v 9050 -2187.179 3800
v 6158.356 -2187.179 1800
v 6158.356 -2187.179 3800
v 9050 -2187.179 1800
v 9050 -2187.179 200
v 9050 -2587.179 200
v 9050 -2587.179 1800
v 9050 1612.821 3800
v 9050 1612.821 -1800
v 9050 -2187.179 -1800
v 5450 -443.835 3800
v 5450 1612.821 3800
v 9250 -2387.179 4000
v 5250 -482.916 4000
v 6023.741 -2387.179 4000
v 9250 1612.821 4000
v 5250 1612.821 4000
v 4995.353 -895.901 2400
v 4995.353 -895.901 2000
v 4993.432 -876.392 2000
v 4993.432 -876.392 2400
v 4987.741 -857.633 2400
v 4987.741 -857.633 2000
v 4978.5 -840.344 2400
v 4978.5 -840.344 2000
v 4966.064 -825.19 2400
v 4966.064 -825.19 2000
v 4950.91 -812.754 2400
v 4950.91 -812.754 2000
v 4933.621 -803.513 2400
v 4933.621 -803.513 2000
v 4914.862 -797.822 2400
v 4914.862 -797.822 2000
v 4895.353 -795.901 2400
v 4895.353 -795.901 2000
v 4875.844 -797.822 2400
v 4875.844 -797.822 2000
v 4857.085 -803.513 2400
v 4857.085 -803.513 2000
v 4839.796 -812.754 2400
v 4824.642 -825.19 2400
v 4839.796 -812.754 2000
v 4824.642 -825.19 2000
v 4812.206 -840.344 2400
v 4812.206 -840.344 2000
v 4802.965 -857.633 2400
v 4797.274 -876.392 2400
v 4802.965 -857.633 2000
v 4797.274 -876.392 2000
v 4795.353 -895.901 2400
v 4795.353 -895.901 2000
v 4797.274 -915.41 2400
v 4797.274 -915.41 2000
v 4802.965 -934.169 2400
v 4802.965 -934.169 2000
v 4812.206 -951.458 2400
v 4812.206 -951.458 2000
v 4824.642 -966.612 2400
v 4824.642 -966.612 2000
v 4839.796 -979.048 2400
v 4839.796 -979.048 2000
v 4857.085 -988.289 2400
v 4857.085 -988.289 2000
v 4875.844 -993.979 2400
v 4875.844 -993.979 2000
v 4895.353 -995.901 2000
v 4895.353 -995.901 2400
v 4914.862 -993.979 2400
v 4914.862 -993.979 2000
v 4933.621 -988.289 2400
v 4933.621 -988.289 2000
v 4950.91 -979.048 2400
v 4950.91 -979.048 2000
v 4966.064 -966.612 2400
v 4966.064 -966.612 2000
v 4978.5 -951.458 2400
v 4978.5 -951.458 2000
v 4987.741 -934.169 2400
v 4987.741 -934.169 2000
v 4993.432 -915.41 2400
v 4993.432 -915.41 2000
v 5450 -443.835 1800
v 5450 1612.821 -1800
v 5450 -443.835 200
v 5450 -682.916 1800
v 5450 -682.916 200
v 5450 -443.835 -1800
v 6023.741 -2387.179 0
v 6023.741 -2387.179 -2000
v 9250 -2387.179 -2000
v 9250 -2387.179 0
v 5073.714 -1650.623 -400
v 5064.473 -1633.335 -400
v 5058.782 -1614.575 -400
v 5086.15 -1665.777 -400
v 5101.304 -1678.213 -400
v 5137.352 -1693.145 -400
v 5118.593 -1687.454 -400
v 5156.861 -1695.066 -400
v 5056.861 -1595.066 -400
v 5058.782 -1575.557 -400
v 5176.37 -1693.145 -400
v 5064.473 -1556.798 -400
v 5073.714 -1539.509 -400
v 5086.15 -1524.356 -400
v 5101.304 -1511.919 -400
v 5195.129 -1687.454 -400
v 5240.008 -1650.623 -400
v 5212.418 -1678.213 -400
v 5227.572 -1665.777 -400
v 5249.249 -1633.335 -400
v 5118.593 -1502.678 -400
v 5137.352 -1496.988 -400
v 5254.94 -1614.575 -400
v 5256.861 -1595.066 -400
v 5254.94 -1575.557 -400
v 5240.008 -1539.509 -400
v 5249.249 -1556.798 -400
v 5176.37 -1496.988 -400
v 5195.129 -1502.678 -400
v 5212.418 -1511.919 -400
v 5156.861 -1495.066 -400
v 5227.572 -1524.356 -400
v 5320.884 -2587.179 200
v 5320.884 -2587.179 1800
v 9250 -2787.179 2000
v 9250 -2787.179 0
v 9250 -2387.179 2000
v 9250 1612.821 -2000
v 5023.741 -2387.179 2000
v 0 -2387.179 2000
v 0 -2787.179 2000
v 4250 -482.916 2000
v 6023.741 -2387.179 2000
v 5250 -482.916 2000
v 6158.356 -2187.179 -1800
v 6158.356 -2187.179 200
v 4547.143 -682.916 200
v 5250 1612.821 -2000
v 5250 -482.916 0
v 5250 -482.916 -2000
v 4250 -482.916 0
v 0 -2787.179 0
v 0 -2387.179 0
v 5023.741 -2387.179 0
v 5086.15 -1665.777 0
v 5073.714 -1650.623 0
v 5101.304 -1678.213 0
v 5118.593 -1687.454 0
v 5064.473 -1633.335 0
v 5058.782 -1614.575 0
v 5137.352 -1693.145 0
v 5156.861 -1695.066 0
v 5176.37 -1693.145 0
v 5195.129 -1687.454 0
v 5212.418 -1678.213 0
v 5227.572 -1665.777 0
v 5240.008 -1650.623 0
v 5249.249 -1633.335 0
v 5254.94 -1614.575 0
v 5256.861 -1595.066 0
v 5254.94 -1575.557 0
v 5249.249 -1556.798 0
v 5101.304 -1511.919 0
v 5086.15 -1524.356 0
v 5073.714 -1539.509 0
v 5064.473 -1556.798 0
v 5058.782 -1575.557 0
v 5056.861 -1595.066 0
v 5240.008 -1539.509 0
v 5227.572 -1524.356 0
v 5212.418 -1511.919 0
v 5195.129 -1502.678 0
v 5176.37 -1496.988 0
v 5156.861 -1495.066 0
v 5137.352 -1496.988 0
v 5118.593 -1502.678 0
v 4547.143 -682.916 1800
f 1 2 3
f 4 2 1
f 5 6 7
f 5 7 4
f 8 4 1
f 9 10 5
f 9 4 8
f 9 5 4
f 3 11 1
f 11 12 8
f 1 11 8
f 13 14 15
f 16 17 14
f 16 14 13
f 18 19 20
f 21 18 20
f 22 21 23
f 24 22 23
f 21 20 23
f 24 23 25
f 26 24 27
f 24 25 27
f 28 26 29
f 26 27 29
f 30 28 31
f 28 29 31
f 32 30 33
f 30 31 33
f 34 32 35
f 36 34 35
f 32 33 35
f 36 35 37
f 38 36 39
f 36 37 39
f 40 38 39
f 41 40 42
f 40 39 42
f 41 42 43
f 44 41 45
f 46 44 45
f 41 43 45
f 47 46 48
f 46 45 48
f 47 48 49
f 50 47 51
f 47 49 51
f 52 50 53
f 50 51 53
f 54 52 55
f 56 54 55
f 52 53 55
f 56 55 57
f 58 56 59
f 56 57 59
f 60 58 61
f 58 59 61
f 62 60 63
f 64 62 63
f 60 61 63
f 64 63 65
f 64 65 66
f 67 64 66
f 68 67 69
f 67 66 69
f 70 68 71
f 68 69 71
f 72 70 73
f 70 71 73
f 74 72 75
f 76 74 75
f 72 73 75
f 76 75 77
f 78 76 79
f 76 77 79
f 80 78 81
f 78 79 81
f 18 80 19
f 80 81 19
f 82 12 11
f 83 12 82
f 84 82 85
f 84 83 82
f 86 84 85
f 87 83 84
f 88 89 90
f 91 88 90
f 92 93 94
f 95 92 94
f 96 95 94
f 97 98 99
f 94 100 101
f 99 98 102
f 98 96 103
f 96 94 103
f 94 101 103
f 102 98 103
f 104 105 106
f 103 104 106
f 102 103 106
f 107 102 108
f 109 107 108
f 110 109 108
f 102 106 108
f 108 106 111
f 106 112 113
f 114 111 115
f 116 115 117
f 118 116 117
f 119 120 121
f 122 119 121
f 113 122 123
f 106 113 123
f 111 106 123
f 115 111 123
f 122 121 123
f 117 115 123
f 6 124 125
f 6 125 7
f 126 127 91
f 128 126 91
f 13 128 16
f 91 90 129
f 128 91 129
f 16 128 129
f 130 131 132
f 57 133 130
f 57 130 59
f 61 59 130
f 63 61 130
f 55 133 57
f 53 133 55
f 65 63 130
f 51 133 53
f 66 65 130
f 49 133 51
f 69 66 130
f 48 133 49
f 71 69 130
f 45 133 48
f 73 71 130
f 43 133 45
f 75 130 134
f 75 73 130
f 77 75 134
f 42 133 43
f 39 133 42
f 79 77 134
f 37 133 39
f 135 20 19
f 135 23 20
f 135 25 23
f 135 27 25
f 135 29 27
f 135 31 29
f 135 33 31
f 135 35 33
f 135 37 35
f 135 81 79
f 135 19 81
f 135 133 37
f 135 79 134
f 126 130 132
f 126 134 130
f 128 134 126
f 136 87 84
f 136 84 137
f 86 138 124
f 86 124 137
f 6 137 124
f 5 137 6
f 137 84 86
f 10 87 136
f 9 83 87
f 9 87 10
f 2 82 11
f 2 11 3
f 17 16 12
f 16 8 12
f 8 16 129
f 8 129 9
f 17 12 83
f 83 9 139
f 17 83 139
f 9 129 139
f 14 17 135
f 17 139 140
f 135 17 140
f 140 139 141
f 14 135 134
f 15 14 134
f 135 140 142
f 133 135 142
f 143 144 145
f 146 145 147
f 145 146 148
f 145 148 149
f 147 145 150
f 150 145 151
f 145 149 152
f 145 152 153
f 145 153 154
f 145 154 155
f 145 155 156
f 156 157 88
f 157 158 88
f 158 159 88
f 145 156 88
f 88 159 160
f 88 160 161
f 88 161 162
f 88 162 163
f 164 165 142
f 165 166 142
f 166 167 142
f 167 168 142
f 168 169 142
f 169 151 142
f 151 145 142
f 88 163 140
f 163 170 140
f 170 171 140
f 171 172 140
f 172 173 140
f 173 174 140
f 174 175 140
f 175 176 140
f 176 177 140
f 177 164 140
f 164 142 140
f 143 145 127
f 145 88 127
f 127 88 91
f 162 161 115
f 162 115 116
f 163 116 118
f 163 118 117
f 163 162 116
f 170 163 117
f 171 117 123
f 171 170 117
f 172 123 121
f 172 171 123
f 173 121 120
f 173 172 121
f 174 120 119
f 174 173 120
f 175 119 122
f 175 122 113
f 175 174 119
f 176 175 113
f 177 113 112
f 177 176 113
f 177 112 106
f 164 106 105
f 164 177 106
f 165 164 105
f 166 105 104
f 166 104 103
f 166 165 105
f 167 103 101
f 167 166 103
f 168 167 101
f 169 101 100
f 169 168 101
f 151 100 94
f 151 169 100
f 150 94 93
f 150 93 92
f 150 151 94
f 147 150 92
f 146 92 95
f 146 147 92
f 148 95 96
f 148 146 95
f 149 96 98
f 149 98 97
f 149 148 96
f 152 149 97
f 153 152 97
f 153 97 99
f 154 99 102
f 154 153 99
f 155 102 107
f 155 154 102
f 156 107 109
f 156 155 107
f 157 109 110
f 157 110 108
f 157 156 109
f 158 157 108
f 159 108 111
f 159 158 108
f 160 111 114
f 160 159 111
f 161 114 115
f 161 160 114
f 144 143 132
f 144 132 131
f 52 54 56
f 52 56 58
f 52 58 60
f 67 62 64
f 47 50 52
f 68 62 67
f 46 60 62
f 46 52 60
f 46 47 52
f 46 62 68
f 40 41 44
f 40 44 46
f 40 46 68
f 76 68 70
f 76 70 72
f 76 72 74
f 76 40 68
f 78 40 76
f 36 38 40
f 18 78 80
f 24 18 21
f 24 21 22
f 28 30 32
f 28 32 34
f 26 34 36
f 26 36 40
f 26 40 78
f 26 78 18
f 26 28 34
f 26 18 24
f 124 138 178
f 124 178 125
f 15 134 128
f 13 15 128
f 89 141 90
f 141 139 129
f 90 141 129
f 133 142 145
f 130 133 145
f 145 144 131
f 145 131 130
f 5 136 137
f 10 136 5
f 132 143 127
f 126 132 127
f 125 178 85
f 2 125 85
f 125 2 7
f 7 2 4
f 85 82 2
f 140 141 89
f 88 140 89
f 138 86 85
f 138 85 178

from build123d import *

# Parameters (mm, degrees)
SKETCH14_R               = 100
SKETCH14_W               = 9250
SKETCH14_H               = 400
BOSS_EXTRUDE1_DEPTH      = 2000
BOSS_EXTRUDE2_DEPTH      = 4000
BOSS_EXTRUDE2_DEPTH_BACK = 2000
SHELL2_START             = -1800
SHELL2_DEPTH             = 5600
SHELL2_START_2           = 200
SHELL2_2_DEPTH           = 1600
SKETCH16_R               = 100
BOSS_EXTRUDE3_DEPTH      = 400
SKETCH14_4_R             = 100
BOSS_EXTRUDE4_DEPTH      = 400


# Read off the part's stored shape, not the designer's step: Shell2
with BuildPart() as part:
    # Sketch14 → Boss-Extrude1 (new body)
    # profile 1 of 4: a face of its own
    with BuildSketch(Plane.XY):
        Polygon((4250, -482.915977061), (5023.740659122, -2387.179002407), (6023.740659122, -2387.179002407), (5250, -482.915977061), align=None)
        with Locations((5156.86100387, -1595.066332677)):
            Circle(SKETCH14_R, mode=Mode.SUBTRACT)
        with Locations((4895.353014227, -895.900869711)):
            Circle(SKETCH14_R, mode=Mode.SUBTRACT)
    # profile 2 of 4: a face of its own
    with BuildSketch(Plane.XY):
        with Locations((4625, -2587.179002407)):
            Rectangle(SKETCH14_W, SKETCH14_H)
    # profile 3 of 4: a face of its own
    with BuildSketch(Plane.XY):
        with Locations((4895.353014227, -895.900869711)):
            Circle(SKETCH14_R)
    # profile 4 of 4: a face of its own
    with BuildSketch(Plane.XY):
        with Locations((5156.86100387, -1595.066332677)):
            Circle(SKETCH14_R)
    extrude(amount=BOSS_EXTRUDE1_DEPTH)

    # Sketch14<3> → Boss-Extrude2 (add, two sides: drawn at the far end of the back side and taken through both)
    with BuildSketch(Plane.XY.offset(-BOSS_EXTRUDE2_DEPTH_BACK)):
        Polygon((5250, -482.915977061), (6023.740659122, -2387.179002407), (9250, -2387.179002407), (9250, 1612.820997593), (5250, 1612.820997593), align=None)
    extrude(amount=BOSS_EXTRUDE2_DEPTH + BOSS_EXTRUDE2_DEPTH_BACK)

    # Shell2 outline → Shell2 (cut)
    with BuildSketch(Plane.XY.offset(SHELL2_START)):
        Polygon((5450, 1612.820997593), (5450, -443.835376078), (6158.355846098, -2187.179002407), (9050, -2187.179002407), (9050, 1612.820997593), align=None)
    extrude(amount=SHELL2_DEPTH, mode=Mode.SUBTRACT)

    # Shell2 2 outline → Shell2 2 (cut)
    with BuildSketch(Plane.XY.offset(SHELL2_START_2)):
        Polygon((5450, -443.835376078), (5450, -682.915977061), (4547.143293403, -682.915977061), (5320.883952525, -2587.179002407), (9050, -2587.179002407), (9050, -2187.179002407), (6158.355846098, -2187.179002407), align=None)
    extrude(amount=SHELL2_2_DEPTH, mode=Mode.SUBTRACT)

    # Sketch16 → Boss-Extrude3 (add)
    with BuildSketch(Plane.XY.offset(2000)):
        with Locations((4895.353014227, -895.900869711)):
            Circle(SKETCH16_R)
    extrude(amount=BOSS_EXTRUDE3_DEPTH)

    # Sketch14<4> → Boss-Extrude4 (add)
    with BuildSketch(Plane.XY):
        with Locations((5156.86100387, -1595.066332677)):
            Circle(SKETCH14_4_R)
    extrude(amount=-BOSS_EXTRUDE4_DEPTH)


solid = part.part
